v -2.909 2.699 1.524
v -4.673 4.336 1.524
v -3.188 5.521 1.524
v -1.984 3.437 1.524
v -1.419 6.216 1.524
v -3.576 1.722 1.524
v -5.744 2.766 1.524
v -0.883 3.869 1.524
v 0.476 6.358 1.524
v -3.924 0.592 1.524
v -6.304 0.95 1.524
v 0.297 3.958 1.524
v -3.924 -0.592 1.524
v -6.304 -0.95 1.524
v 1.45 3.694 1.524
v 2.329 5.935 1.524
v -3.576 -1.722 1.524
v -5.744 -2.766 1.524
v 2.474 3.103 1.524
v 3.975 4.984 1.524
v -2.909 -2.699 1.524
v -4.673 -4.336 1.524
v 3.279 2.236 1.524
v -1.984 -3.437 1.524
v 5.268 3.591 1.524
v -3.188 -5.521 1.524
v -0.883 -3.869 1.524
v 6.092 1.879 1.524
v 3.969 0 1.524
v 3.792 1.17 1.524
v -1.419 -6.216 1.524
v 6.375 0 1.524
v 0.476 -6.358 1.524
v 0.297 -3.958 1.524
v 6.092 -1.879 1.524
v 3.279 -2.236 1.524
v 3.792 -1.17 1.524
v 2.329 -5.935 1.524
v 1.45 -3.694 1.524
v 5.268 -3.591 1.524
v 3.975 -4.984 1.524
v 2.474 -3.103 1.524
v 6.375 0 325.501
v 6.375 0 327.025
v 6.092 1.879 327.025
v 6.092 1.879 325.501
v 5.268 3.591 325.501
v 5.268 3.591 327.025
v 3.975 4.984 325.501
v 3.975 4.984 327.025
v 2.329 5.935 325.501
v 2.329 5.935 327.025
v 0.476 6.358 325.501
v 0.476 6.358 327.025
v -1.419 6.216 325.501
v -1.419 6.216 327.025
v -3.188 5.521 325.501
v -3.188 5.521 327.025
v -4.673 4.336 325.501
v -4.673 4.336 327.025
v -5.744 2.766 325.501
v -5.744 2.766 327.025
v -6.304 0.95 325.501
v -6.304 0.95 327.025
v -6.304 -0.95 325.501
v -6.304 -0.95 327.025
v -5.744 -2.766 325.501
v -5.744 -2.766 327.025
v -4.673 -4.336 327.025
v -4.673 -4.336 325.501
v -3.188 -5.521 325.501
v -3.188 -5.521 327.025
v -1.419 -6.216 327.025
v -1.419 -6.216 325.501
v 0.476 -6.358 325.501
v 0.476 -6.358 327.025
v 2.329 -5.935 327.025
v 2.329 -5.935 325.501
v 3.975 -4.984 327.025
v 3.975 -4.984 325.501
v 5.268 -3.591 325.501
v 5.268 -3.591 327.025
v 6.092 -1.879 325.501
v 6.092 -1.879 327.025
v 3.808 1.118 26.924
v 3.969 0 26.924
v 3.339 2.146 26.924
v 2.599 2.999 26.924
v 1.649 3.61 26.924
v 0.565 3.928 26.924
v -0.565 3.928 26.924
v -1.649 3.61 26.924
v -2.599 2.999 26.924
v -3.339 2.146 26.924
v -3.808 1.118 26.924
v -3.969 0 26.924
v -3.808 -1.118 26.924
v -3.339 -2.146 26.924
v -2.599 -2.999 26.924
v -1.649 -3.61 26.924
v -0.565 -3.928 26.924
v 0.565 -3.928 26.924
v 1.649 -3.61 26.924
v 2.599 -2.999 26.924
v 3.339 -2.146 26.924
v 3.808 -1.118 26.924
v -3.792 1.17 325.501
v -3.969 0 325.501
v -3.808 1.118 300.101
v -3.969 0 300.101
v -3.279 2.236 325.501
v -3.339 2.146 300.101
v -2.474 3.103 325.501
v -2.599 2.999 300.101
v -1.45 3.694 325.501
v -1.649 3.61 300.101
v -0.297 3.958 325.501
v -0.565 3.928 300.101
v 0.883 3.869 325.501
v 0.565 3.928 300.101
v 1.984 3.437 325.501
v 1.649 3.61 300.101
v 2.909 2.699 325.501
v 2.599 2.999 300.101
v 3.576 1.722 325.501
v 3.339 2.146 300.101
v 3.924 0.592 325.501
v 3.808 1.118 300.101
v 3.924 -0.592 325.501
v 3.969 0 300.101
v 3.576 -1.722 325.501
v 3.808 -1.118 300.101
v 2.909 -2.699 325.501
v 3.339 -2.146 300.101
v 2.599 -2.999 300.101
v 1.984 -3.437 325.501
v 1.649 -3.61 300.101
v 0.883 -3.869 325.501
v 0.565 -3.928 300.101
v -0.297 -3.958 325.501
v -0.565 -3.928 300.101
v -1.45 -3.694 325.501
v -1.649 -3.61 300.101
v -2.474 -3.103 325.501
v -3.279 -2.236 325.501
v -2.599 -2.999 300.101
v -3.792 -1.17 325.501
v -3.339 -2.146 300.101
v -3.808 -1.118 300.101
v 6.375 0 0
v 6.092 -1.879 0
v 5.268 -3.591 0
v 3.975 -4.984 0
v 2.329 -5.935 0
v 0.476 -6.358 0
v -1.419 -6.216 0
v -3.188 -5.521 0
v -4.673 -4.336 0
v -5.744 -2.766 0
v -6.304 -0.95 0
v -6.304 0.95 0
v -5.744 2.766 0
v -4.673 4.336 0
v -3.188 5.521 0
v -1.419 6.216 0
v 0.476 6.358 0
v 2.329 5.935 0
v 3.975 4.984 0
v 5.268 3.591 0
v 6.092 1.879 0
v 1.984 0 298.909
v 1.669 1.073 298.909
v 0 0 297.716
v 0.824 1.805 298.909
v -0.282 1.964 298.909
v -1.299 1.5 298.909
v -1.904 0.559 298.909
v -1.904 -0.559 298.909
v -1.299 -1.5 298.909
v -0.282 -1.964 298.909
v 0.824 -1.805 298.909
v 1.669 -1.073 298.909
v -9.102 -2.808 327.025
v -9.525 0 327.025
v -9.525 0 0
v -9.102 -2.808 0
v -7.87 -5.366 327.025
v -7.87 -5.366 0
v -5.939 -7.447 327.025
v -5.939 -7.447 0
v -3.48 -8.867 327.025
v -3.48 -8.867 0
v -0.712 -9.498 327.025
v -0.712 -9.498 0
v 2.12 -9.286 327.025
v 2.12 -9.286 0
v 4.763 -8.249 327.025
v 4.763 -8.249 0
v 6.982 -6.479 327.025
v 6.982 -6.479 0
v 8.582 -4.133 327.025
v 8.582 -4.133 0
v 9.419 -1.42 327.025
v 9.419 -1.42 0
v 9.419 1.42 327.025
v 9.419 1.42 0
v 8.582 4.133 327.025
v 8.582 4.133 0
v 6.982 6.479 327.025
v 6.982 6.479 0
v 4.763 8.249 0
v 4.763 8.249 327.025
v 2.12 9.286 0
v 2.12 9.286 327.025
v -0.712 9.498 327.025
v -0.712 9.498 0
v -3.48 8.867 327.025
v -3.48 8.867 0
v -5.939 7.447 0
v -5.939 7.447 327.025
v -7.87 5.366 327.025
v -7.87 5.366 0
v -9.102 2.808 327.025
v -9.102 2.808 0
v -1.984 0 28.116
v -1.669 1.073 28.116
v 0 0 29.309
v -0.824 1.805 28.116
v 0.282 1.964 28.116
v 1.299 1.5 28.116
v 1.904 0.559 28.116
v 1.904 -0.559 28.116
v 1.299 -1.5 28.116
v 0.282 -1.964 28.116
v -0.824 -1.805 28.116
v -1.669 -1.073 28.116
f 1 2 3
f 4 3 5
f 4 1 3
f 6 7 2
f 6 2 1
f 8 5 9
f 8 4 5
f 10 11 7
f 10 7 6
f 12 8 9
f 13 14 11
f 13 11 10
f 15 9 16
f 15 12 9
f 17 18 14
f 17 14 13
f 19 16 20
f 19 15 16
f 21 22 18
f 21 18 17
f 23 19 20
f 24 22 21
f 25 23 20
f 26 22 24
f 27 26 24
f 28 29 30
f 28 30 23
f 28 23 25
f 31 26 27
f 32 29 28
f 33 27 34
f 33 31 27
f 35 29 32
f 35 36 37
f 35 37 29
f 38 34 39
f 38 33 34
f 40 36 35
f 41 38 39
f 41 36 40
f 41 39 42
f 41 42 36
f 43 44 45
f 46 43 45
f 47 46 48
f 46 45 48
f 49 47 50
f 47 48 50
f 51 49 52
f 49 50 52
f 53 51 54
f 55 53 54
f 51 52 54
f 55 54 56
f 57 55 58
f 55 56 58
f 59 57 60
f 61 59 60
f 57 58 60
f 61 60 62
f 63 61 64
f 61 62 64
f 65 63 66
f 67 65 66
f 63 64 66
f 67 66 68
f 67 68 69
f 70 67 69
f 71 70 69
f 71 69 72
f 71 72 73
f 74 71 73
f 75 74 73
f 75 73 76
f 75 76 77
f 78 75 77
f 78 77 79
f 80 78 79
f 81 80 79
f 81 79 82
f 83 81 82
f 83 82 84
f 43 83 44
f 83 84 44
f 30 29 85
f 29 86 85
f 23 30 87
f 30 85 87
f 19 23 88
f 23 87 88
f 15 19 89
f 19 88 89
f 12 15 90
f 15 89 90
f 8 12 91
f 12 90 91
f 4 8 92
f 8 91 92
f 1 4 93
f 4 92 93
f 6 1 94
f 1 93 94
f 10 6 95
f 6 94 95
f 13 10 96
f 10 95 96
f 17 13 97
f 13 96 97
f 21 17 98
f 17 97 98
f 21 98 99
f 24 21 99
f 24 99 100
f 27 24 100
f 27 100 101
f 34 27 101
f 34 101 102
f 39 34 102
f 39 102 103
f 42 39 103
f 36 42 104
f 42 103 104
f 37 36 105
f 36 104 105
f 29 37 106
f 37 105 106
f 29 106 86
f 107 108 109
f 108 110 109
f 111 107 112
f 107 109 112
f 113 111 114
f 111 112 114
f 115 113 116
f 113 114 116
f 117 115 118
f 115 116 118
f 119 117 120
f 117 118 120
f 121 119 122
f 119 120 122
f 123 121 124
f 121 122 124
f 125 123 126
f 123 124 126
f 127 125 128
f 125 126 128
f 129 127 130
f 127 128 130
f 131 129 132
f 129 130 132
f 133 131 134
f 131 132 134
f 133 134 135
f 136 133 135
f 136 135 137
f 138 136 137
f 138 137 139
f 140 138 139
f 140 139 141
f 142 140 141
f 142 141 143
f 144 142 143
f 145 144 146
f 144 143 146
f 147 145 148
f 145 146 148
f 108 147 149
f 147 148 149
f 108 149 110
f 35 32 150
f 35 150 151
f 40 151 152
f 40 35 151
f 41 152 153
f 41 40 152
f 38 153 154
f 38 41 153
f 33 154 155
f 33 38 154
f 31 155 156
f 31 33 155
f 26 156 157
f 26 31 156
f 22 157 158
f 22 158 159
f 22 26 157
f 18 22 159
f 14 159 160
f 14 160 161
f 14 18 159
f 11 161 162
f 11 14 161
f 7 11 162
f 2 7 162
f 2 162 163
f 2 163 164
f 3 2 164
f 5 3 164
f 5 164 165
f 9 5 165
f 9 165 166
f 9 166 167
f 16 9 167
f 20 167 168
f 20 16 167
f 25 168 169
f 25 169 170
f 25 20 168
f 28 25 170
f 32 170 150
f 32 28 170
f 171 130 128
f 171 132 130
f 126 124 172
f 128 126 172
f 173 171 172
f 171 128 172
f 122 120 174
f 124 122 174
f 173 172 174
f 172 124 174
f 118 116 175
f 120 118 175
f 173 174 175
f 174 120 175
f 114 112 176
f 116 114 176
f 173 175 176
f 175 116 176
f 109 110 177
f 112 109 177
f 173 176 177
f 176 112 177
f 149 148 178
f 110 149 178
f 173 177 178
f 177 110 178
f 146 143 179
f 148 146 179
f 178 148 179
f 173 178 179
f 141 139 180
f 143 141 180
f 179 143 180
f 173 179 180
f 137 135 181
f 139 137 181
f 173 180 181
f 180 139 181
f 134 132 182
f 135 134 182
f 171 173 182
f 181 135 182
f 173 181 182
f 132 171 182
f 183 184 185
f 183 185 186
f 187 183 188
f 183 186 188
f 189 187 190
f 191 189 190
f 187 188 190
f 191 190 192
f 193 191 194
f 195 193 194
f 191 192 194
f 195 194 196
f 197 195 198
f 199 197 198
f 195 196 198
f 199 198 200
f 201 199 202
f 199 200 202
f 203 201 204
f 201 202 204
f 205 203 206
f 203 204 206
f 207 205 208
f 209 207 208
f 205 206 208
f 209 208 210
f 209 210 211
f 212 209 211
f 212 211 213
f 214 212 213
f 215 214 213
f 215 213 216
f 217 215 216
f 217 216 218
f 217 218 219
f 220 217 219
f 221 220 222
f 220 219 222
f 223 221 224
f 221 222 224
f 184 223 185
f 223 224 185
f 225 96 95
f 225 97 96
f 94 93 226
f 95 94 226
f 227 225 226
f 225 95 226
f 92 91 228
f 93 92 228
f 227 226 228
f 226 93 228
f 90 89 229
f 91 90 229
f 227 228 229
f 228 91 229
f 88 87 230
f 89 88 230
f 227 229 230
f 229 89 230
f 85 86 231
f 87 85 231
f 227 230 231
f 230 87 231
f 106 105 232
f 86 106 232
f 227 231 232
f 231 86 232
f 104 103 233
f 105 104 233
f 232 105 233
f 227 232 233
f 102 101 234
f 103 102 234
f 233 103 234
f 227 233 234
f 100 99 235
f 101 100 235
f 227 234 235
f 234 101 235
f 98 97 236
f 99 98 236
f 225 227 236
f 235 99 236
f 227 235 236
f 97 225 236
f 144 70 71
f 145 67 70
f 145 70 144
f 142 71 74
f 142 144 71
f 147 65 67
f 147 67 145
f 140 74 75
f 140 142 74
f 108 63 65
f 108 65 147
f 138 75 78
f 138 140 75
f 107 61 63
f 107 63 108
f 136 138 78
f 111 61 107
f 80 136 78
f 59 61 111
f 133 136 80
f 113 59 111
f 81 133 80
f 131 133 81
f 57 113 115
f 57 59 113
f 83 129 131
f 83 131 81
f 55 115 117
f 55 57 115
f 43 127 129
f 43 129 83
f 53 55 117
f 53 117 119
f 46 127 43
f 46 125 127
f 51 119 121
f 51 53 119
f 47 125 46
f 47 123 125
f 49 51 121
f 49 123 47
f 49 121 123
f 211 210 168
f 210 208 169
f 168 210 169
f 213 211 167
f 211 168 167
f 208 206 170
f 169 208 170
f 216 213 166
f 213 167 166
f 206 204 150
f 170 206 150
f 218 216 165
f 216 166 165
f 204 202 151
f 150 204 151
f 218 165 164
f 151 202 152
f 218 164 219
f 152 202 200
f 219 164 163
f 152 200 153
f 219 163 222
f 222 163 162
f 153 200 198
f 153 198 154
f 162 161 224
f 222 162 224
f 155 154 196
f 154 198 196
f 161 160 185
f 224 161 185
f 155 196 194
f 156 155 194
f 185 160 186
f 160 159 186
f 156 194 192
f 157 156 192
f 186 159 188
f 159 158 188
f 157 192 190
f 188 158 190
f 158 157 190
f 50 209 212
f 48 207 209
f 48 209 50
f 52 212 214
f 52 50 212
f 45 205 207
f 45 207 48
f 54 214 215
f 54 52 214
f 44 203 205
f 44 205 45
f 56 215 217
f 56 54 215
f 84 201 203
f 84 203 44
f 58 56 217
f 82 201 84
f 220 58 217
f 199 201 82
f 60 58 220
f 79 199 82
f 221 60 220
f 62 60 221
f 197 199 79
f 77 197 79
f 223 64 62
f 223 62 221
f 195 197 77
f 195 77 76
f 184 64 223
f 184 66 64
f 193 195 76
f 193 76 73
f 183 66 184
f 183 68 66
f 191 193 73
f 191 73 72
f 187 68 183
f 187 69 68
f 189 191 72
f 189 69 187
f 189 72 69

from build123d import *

# Parameters (mm, degrees)
SKETCH1_R                   = 9.525
BOSS_EXTRUDE1_DEPTH         = 327.025
SKETCH2_R                   = 6.3754
CUT_EXTRUDE1_DEPTH          = 1.524
F_3_8_16_TAPPED_HOLE1_D     = 7.9375
F_3_8_16_TAPPED_HOLE1_DEPTH = 25.4
F_3_8_16_TAPPED_HOLE1_TIP   = 2.384665582
CUT_EXTRUDE2_START          = -1.524
SKETCH5_R                   = 6.3754
CUT_EXTRUDE2_DEPTH          = 1.524
F_3_8_16_TAPPED_HOLE2_D     = 7.9375
F_3_8_16_TAPPED_HOLE2_DEPTH = 25.4
F_3_8_16_TAPPED_HOLE2_TIP   = 2.384665582


with BuildPart() as part:
    # Sketch1 → Boss-Extrude1 (new body)
    with BuildSketch(Plane.XY):
        with Locations(Location((0, 0, 0), (0, 0, 180))):
            Circle(SKETCH1_R)
    extrude(amount=BOSS_EXTRUDE1_DEPTH)

    # Sketch2 → Cut-Extrude1 (cut)
    with BuildSketch(Plane.XY.offset(327.025)):
        Circle(SKETCH2_R)
    extrude(amount=-CUT_EXTRUDE1_DEPTH, mode=Mode.SUBTRACT)

    # 3/8-16 Tapped Hole1
    with Locations(Plane.XY.offset(325.501)):
        with Locations((0, 0)):
            Hole(F_3_8_16_TAPPED_HOLE1_D / 2, depth=F_3_8_16_TAPPED_HOLE1_DEPTH)
            with Locations((0, 0, -(F_3_8_16_TAPPED_HOLE1_DEPTH + F_3_8_16_TAPPED_HOLE1_TIP / 2))):  # 118° drill point
                Cone(0, F_3_8_16_TAPPED_HOLE1_D / 2, F_3_8_16_TAPPED_HOLE1_TIP, mode=Mode.SUBTRACT)

    # Sketch5 → Cut-Extrude2 (cut)
    with BuildSketch(Plane(origin=(0, 0, 0), x_dir=(-1, 0, 0), z_dir=(0, 0, -1)).offset(CUT_EXTRUDE2_START)):
        with Locations(Location((0, 0, 0), (0, 0, 180))):
            Circle(SKETCH5_R)
    extrude(amount=CUT_EXTRUDE2_DEPTH, mode=Mode.SUBTRACT)

    # 3/8-16 Tapped Hole2
    with Locations(Plane(origin=(0, 0, 1.524), x_dir=(-1, 0, 0), z_dir=(0, 0, -1))):
        with Locations((0, 0)):
            Hole(F_3_8_16_TAPPED_HOLE2_D / 2, depth=F_3_8_16_TAPPED_HOLE2_DEPTH)
            with Locations((0, 0, -(F_3_8_16_TAPPED_HOLE2_DEPTH + F_3_8_16_TAPPED_HOLE2_TIP / 2))):  # 118° drill point
                Cone(0, F_3_8_16_TAPPED_HOLE2_D / 2, F_3_8_16_TAPPED_HOLE2_TIP, mode=Mode.SUBTRACT)


solid = part.part
